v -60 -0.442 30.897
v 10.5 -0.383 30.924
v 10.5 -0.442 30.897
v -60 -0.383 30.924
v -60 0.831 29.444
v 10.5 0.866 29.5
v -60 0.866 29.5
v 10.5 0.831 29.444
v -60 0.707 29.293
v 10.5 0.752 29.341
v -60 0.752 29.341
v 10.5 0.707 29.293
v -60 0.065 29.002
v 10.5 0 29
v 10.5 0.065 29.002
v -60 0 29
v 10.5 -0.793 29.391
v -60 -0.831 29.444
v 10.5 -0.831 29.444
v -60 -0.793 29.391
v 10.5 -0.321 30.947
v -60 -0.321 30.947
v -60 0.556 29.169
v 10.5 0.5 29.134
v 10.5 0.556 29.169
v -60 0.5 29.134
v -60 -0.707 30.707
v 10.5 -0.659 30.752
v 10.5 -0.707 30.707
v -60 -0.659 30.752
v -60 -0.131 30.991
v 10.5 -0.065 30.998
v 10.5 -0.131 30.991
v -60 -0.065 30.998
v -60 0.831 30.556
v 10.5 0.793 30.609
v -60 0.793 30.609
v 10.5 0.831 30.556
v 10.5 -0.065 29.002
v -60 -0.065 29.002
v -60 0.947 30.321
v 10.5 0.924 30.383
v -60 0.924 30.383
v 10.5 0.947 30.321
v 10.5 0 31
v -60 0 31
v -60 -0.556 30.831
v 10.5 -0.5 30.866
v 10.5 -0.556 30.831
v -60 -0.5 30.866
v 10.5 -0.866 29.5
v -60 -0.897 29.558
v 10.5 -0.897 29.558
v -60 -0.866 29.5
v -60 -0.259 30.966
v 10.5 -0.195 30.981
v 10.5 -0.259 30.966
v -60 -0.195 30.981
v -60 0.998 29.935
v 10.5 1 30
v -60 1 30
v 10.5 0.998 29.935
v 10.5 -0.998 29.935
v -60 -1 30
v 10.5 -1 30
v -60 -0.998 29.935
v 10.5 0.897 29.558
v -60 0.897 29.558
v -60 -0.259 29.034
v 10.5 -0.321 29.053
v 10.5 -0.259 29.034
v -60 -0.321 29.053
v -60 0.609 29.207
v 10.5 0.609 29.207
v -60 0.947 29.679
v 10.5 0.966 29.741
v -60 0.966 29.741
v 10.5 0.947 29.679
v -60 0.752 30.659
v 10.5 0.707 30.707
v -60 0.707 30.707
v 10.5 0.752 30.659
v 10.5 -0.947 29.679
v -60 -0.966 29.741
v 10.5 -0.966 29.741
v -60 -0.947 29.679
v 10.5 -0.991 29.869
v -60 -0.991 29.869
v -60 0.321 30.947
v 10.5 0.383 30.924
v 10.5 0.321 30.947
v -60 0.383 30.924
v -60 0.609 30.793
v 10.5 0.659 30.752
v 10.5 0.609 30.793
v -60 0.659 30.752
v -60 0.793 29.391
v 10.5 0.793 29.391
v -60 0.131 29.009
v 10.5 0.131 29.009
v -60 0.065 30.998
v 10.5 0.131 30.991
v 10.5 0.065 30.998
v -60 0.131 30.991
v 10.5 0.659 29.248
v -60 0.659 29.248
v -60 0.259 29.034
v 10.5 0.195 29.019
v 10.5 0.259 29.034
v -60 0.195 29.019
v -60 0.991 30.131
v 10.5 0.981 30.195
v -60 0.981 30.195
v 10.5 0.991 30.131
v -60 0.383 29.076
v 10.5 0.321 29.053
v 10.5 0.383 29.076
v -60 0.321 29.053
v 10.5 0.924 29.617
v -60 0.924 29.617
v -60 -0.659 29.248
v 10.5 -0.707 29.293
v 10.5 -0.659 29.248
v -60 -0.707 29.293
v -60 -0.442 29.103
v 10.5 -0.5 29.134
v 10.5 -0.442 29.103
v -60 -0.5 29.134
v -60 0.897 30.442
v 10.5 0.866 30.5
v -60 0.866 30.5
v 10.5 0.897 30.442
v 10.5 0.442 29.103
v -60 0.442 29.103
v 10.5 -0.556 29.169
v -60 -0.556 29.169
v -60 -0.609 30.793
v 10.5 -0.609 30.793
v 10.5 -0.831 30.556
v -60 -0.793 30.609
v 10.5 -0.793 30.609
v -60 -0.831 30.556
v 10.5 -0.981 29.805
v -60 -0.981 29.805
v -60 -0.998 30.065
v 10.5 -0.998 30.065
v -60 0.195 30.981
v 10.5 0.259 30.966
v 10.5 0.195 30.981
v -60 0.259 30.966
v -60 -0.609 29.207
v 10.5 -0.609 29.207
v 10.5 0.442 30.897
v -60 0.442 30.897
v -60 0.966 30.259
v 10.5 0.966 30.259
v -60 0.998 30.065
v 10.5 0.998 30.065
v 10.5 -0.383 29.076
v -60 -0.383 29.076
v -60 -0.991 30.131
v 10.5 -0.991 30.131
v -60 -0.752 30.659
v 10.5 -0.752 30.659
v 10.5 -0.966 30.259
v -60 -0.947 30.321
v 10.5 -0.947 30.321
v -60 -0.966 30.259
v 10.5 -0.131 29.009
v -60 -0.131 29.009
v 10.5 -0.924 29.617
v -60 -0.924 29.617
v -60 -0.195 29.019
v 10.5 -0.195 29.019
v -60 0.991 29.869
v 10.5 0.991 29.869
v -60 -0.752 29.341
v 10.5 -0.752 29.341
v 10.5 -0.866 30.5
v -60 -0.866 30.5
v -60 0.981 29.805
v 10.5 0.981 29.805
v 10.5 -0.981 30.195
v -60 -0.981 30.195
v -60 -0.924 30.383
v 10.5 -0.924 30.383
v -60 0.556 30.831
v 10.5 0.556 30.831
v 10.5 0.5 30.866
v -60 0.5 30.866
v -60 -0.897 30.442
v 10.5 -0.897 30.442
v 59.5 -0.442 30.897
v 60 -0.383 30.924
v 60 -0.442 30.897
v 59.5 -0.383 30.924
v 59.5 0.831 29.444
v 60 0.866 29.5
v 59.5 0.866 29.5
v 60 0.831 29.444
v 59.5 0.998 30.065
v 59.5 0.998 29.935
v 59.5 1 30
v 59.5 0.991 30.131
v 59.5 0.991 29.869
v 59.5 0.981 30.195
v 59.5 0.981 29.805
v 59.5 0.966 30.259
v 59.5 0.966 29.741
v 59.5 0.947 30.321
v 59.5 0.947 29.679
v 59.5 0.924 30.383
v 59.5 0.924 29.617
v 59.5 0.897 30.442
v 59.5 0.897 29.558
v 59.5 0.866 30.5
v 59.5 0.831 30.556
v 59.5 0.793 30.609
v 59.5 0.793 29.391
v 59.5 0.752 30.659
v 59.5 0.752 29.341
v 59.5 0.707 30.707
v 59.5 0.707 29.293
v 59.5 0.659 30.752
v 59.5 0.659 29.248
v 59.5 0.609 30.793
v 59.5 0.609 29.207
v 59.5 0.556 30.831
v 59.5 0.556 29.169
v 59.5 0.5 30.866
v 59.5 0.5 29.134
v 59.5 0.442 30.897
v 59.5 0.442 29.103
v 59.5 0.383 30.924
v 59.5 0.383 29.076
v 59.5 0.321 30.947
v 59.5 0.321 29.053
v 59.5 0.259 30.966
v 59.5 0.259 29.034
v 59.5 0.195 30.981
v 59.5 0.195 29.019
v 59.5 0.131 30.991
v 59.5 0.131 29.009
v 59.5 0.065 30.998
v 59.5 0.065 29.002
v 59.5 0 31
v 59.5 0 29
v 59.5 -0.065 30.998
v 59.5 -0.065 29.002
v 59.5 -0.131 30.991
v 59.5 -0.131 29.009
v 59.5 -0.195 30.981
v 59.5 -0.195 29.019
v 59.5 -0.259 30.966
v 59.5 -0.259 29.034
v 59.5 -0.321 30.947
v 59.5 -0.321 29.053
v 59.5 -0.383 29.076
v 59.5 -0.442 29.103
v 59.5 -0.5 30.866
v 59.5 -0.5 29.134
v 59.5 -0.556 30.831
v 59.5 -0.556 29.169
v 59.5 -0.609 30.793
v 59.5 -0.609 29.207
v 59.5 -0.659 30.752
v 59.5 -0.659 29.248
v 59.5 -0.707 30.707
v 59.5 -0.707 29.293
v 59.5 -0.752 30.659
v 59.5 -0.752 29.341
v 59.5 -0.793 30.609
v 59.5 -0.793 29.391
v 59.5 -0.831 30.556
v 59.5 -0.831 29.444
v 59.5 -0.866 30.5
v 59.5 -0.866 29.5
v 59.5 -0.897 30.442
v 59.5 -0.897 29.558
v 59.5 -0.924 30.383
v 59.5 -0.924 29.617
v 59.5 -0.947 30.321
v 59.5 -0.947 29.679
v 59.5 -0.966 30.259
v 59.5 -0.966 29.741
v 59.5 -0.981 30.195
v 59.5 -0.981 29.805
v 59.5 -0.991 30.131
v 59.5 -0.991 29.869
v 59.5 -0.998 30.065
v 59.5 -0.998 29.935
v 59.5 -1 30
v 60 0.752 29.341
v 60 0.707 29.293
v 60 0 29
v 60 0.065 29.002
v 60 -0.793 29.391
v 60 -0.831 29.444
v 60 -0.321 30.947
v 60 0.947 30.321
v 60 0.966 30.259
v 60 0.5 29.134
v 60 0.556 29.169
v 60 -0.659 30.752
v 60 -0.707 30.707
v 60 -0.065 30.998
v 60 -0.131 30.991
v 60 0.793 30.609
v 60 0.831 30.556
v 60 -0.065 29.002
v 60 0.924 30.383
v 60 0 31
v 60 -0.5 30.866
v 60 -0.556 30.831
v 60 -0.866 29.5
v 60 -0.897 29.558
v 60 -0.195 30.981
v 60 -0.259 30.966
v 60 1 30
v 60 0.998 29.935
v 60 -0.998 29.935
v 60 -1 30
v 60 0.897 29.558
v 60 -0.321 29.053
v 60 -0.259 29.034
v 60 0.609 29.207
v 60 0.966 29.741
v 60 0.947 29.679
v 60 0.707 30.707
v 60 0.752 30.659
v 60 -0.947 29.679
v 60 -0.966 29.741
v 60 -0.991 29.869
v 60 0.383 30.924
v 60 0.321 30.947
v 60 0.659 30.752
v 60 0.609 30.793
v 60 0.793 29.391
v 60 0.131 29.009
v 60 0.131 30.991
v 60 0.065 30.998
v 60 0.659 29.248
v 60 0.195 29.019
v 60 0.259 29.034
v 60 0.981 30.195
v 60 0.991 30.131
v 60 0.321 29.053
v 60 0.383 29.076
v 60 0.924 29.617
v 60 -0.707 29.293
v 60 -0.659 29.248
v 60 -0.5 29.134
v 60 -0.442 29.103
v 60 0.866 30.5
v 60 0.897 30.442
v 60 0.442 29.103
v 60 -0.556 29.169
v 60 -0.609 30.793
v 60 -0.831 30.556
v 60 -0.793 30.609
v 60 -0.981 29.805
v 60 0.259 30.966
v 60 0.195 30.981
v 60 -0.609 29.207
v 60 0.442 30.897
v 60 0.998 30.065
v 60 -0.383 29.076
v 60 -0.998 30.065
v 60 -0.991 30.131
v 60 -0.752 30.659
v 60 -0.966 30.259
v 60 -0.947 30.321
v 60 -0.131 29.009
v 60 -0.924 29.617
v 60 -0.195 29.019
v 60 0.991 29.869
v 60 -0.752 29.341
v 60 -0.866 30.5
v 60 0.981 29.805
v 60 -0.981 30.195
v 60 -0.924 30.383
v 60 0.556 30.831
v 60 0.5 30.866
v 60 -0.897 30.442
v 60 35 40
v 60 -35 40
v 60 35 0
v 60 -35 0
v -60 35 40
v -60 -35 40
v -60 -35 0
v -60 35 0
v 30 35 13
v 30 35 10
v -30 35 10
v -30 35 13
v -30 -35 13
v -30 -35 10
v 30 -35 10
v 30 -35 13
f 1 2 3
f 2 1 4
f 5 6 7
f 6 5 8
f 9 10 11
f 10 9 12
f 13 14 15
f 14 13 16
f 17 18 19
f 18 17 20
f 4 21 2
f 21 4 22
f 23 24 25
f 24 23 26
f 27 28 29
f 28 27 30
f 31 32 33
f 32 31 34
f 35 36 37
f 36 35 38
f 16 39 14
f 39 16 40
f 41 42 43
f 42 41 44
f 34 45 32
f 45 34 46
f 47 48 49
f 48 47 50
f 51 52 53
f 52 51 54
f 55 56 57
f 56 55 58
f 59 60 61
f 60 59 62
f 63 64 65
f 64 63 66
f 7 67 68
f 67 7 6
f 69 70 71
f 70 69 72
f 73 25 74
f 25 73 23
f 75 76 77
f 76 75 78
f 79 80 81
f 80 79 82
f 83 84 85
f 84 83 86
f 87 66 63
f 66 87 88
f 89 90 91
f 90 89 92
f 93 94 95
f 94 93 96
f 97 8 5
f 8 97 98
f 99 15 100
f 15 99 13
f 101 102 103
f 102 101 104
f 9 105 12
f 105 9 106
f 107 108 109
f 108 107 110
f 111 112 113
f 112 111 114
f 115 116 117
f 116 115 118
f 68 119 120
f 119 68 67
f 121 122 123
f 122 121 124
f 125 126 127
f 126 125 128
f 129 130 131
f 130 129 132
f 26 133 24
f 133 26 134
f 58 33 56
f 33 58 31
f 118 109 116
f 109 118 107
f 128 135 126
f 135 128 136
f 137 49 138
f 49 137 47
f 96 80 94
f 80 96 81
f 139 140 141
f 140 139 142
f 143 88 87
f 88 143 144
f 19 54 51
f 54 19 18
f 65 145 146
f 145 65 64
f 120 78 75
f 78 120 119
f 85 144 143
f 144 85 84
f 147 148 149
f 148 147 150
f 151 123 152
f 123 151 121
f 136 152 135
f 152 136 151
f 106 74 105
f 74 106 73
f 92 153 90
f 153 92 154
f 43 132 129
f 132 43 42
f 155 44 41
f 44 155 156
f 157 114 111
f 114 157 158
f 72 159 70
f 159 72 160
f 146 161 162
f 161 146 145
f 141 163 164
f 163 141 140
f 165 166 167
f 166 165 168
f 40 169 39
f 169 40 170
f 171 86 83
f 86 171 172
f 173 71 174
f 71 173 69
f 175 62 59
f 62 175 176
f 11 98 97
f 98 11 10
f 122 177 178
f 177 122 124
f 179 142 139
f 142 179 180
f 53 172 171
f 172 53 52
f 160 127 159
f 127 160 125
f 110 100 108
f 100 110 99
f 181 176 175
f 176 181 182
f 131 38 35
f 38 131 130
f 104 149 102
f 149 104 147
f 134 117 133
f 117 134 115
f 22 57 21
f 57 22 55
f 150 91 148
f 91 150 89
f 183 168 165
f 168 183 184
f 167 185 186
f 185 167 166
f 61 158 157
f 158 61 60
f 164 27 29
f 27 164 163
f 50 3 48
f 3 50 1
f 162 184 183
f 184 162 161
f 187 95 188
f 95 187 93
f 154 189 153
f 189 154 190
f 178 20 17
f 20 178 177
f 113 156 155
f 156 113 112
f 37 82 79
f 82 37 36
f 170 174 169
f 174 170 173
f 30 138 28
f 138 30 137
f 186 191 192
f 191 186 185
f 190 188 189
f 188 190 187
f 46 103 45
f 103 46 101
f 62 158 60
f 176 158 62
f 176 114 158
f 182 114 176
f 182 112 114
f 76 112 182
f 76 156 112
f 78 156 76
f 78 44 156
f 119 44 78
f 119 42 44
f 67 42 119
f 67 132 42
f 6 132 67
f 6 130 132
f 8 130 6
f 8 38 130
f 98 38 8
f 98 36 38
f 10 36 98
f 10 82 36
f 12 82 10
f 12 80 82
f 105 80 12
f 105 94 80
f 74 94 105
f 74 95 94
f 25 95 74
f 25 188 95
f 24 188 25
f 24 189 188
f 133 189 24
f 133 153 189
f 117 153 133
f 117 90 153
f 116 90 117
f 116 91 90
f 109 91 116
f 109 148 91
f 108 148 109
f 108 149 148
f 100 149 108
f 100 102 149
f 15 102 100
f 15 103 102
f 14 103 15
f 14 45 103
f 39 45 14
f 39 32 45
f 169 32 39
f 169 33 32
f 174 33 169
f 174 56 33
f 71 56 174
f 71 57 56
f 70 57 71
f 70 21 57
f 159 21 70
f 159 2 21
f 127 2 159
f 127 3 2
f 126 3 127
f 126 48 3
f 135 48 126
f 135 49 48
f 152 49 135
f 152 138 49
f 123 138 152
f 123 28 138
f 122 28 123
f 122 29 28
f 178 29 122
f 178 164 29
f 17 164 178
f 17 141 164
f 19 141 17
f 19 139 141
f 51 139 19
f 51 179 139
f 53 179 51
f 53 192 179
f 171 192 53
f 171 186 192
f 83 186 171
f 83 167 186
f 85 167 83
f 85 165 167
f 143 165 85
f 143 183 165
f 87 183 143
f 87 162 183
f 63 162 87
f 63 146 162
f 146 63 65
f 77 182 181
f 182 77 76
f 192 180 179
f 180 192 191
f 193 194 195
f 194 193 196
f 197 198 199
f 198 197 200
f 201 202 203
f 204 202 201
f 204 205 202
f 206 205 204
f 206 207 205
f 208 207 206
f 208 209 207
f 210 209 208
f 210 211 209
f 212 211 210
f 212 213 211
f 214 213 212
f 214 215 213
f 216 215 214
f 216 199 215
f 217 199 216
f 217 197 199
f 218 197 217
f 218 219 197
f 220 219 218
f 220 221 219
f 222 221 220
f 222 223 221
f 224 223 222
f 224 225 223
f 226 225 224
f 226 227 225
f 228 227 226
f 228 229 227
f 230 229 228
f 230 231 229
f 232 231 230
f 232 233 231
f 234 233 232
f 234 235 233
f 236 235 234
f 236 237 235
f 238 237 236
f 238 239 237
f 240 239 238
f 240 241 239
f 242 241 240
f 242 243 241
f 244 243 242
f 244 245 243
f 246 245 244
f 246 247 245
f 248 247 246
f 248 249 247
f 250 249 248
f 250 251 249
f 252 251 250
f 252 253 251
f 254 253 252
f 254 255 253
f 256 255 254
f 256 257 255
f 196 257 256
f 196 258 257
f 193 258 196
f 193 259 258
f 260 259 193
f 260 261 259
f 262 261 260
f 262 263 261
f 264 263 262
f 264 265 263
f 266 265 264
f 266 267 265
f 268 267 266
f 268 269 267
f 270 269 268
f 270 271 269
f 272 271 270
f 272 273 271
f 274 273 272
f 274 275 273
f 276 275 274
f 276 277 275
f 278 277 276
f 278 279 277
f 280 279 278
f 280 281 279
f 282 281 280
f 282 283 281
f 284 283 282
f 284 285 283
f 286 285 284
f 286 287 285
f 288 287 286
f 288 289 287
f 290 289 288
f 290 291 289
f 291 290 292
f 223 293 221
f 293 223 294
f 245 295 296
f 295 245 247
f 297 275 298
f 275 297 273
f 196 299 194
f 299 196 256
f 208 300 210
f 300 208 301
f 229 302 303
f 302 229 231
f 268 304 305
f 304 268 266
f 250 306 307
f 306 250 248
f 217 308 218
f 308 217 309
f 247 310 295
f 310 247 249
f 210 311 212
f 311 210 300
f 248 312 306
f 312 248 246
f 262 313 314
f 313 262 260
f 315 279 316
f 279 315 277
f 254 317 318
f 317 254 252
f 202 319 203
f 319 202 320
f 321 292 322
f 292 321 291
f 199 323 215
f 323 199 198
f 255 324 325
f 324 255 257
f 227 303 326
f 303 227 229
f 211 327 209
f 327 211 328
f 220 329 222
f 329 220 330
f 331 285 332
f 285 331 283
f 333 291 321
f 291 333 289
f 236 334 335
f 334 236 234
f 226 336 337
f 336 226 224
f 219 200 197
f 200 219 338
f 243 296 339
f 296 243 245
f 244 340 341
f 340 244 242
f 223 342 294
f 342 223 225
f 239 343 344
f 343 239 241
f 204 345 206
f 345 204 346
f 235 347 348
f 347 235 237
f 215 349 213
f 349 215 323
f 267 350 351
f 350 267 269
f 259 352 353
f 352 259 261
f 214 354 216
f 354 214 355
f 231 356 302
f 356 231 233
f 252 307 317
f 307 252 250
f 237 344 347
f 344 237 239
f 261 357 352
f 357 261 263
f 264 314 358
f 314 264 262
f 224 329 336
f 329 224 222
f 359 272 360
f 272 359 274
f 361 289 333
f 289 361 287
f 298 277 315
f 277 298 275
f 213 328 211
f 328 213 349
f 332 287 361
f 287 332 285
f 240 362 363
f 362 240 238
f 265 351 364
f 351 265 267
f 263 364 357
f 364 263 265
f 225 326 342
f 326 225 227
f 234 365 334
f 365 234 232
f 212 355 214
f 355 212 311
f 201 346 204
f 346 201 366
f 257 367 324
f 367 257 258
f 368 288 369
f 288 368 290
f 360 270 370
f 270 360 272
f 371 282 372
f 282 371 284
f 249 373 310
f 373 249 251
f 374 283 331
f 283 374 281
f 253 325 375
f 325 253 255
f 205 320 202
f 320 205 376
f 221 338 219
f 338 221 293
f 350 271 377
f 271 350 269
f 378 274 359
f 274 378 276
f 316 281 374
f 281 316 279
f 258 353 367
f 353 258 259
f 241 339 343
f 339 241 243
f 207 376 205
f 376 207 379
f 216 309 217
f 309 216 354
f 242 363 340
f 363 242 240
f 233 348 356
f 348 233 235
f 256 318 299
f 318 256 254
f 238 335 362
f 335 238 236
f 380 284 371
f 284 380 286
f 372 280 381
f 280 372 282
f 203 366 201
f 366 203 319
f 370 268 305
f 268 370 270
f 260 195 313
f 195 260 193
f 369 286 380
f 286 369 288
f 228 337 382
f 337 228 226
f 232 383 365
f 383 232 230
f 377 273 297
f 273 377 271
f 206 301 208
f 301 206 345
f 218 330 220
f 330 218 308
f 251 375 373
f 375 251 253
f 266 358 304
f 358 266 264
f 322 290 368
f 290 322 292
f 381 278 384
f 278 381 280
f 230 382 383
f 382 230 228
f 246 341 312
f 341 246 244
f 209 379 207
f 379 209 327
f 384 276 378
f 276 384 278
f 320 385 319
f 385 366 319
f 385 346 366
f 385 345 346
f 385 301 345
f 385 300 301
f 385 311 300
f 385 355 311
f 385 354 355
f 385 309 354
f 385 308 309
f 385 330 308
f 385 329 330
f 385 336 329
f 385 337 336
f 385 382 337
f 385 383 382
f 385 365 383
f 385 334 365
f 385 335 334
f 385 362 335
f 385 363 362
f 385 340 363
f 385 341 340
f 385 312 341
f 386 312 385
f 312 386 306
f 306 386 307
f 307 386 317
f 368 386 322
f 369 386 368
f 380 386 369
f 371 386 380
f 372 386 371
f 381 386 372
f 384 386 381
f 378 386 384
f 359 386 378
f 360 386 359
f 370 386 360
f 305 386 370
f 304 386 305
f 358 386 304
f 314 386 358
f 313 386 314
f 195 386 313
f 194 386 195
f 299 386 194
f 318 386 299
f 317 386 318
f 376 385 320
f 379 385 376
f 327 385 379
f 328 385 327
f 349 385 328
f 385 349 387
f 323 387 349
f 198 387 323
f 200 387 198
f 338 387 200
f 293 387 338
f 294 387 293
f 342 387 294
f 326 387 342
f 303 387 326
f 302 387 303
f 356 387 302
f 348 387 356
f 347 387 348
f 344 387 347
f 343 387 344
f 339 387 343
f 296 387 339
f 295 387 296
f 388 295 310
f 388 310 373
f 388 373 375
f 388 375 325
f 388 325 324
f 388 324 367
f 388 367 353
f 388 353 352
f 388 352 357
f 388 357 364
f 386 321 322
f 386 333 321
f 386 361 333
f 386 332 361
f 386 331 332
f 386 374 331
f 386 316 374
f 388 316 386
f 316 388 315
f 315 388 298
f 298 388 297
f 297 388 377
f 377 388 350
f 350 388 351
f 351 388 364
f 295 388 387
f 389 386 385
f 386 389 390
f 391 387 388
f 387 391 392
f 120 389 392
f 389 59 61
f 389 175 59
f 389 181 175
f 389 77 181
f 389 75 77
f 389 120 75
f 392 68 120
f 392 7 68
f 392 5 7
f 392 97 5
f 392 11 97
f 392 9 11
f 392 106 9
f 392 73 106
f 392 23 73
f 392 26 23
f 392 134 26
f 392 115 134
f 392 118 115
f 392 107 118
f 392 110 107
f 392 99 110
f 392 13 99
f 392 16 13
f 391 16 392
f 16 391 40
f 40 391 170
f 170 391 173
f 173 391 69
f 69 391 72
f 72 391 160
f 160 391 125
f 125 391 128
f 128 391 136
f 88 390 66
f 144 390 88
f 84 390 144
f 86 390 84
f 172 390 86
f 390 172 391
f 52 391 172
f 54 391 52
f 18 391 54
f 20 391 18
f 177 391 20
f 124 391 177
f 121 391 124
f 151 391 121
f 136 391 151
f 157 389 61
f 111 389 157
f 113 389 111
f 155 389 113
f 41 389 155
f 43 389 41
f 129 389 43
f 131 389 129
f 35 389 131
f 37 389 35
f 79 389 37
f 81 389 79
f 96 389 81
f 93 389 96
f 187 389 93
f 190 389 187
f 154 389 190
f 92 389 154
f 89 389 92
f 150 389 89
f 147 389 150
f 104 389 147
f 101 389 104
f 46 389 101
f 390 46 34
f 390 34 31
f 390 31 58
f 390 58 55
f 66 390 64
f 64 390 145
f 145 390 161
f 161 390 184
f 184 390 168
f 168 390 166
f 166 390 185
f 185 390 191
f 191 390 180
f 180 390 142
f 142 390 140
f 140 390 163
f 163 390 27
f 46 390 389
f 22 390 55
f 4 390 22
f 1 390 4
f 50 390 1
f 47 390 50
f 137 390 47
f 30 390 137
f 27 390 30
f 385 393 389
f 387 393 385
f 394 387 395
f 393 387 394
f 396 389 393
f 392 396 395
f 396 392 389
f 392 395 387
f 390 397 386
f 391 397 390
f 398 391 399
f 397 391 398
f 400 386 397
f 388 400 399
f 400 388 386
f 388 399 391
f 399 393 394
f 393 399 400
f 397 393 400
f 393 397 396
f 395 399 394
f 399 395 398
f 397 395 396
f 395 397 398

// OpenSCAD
// Mini horizontal gel-electrophoresis buffer tank
// Print orientation: base on XY plane, open top at z = 40

// ---- Tank dimensions ----
outer_x = 120;   // outer length along X
outer_y = 70;    // outer width along Y
height  = 40;    // overall height along Z
wall    = 3;     // wall thickness
floor   = 3;     // floor thickness

// ---- Platform dimensions ----
platform_len   = 60;   // platform length along X
platform_top_z = 13;   // platform top height (10 mm above inner floor)

// ---- Electrode holes ----
hole_d = 2;     // hole diameter
hole_y = 0;     // hole Y position
hole_z = 30;    // hole Z position

// ---- Modelling helpers ----
eps = 0.5;       // cutter overshoot past faces
$fn = 96;        // curve resolution

// ---- Derived ----
inner_h = height - floor;              // 37 mm inner floor height
over_h  = platform_top_z - floor;      // 10 mm above inner floor

difference() {
    // Main tank body (solid through walls and floor)
    translate([-outer_x/2, -outer_y/2, 0])
        cube([outer_x, outer_y, height]);

    // Gel-tray platform, centred in X, spanning full width
    translate([-platform_len/2, -outer_y/2, over_h])
        cube([platform_len, outer_y, platform_top_z - over_h]);

    // Horizontal electrode holes through each end wall along X
    for (sx = [-1, 1])
        translate([sx > 0 ? outer_x/2 - eps : -outer_x/2 - eps,
                   hole_y, hole_z])
            rotate([0, 90, 0])
                cylinder(d = hole_d, h = outer_y + 2*eps);
}
